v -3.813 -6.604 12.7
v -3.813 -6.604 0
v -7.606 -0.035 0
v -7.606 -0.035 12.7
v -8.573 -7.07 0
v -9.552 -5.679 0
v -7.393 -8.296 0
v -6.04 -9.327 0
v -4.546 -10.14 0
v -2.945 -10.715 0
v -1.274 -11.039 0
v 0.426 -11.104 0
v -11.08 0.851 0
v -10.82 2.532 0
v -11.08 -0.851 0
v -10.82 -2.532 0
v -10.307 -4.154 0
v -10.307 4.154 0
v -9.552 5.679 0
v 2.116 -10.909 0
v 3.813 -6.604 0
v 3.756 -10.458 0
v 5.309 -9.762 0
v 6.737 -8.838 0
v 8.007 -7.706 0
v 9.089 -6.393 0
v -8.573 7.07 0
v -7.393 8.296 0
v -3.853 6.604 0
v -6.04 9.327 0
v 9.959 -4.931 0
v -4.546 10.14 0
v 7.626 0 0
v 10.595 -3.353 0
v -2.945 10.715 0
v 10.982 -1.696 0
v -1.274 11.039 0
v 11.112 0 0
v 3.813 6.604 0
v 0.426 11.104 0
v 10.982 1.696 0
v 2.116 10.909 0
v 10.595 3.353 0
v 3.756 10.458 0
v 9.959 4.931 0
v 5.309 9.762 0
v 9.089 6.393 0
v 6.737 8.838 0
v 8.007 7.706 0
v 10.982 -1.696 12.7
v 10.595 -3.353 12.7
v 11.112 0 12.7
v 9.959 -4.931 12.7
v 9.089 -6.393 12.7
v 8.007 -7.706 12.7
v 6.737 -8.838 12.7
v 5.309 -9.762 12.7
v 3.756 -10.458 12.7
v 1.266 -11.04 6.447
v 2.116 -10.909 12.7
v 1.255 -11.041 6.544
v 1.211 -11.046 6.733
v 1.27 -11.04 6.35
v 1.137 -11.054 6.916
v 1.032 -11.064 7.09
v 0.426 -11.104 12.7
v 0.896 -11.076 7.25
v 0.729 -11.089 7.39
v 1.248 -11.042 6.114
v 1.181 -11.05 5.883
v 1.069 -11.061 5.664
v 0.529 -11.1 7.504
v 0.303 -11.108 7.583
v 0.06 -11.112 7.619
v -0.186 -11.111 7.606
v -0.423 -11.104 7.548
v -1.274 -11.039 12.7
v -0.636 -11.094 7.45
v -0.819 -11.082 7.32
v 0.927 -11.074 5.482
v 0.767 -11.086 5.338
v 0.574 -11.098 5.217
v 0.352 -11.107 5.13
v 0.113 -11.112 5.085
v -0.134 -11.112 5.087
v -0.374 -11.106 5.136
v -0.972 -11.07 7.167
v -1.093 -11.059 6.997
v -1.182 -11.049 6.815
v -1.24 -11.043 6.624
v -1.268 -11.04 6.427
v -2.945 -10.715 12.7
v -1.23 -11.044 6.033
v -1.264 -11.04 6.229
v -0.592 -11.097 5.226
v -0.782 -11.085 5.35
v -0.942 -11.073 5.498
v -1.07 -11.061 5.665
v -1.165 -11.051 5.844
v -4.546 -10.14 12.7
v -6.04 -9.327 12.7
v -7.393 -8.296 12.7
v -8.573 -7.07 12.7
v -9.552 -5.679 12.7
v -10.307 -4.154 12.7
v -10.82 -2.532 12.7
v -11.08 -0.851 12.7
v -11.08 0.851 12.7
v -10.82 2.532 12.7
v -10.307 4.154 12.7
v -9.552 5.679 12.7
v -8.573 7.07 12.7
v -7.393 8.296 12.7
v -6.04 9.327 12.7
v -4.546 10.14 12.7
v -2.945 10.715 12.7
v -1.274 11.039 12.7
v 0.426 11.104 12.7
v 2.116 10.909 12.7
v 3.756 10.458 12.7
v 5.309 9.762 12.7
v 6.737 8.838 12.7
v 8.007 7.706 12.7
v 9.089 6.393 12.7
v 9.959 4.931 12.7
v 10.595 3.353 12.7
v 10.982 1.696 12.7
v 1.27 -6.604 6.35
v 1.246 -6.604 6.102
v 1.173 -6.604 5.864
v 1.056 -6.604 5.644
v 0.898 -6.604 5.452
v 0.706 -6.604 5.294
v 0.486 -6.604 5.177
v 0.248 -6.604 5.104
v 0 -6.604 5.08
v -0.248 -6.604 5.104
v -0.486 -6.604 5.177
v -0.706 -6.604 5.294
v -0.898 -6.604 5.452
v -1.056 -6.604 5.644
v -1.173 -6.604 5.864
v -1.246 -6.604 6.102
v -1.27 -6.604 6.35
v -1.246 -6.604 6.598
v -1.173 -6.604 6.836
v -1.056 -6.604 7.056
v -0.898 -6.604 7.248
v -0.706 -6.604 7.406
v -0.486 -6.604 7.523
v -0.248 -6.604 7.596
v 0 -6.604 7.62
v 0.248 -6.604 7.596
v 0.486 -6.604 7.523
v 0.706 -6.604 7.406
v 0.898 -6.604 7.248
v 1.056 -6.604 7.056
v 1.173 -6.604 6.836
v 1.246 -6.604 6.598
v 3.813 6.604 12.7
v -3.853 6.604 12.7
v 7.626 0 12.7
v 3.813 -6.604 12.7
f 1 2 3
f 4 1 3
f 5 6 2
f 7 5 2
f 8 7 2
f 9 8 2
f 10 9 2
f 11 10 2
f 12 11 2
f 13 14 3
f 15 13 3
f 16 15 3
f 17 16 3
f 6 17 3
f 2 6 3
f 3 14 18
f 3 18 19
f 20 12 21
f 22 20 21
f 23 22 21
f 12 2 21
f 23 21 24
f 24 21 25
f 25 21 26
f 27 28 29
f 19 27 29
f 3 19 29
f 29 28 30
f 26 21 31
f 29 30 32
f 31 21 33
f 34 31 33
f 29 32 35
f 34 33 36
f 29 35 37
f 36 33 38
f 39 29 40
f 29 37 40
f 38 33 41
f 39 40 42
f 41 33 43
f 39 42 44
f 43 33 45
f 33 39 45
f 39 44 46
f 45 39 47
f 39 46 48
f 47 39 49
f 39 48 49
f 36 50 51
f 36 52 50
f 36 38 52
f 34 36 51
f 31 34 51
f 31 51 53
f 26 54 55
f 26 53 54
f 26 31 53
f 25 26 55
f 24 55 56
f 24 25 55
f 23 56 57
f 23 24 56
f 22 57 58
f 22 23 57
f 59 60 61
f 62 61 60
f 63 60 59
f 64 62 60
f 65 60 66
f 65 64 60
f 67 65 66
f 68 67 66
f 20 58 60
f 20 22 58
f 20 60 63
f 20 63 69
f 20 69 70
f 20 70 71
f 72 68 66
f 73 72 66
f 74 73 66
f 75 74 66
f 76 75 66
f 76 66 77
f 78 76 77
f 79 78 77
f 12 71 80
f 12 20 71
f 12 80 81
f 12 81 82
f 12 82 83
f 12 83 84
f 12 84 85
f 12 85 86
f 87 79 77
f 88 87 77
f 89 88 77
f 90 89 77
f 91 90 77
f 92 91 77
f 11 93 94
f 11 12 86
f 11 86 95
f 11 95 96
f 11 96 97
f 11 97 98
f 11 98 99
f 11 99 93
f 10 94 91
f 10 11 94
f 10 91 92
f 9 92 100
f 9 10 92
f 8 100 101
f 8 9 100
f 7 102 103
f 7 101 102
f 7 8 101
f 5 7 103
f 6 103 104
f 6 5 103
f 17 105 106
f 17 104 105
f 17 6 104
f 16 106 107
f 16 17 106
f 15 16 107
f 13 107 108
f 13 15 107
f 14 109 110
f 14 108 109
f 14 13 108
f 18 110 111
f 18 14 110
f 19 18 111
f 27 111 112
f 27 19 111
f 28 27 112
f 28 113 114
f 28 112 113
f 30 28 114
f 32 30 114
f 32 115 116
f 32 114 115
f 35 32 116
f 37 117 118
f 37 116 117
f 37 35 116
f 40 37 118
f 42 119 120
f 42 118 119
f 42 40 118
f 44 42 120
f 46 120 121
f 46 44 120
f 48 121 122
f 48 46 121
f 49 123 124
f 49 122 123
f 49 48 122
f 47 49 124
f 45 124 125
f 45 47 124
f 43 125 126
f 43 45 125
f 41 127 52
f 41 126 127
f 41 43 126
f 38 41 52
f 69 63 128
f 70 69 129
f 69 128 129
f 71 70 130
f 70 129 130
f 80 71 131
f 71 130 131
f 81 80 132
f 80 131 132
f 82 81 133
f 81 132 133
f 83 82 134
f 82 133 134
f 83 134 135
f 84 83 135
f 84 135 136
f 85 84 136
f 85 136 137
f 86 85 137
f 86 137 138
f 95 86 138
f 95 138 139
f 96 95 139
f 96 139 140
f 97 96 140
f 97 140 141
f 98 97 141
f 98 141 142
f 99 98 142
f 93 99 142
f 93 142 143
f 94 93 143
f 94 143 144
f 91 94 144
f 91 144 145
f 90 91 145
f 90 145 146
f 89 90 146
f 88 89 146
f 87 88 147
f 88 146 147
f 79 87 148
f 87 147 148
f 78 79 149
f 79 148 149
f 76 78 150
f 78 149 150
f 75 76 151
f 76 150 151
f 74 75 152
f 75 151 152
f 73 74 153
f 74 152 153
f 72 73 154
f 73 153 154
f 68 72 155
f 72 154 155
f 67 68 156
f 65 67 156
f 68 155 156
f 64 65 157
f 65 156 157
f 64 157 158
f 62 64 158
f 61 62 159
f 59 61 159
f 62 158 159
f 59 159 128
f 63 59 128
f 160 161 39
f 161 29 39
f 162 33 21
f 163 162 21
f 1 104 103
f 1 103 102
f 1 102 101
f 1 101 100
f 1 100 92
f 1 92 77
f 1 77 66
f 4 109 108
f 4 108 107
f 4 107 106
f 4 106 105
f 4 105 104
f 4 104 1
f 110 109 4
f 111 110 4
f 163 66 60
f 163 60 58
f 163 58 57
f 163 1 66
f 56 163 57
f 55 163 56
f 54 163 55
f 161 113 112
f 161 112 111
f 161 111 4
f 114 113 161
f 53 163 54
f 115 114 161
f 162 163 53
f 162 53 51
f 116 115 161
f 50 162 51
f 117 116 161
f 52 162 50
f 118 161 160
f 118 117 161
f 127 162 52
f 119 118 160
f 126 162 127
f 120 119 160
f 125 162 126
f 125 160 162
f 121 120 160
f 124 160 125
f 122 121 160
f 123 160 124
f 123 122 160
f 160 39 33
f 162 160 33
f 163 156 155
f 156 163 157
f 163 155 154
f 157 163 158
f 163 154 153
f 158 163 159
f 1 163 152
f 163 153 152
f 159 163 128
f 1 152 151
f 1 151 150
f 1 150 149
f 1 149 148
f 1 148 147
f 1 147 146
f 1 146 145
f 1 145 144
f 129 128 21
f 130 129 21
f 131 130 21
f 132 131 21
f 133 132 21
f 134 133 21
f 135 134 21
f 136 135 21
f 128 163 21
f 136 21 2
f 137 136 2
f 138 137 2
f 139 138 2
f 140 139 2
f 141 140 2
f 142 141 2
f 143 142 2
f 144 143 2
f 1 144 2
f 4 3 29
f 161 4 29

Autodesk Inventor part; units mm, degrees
ref_plane "YZ Plane" through (0, 0, 0) normal (1, 0, 0) x (0, 1, 0)
ref_plane "XZ Plane" through (0, 0, 0) normal (0, 1, 0) x (-1, 0, 0)
ref_plane "XY Plane" through (0, 0, 0) normal (0, 0, 1) x (1, 0, 0)
sketch "Sketch1" plane through (0, 0, 0) normal (0, 0, 1) x (1, 0, 0)
  circle A0 centre (0, 0) radius 11.1125
  line L0 (0, 0) -> (7.6256, 0)
  line L1 (-3.8526, 6.604) -> (3.8128, 6.604)
  line L2 (3.8128, 6.604) -> (7.6256, 0)
  line L3 (7.6256, 0) -> (3.8128, -6.604)
  line L4 (3.8128, -6.604) -> (-3.8128, -6.604)
  line L5 (-3.8128, -6.604) -> (-7.6056, -0.0348)
  line L6 (-7.6056, -0.0348) -> (-3.8526, 6.604)
  line L7 (0, 0) -> (0, 6.604)
  line L8 (0, 0) -> (0, -6.604)
  line L9 (0, 0) -> (-5.7192, 3.302)
  line L10 (0, 0) -> (5.7192, -3.302)
  line L11 (0, 0) -> (5.7192, 3.302)
  line L12 (0, 0) -> (-5.7192, -3.302)
  line L13 (-7.2737, 0.1016) -> (-3.7248, 6.2484)
  line L14 (-3.5489, 6.35) -> (3.5489, 6.35)
  arc A1 (3.7248, 6.2484) -> (3.5489, 6.35) centre (3.5489, 6.1468) ccw
  line L15 (3.7248, 6.2484) -> (7.2737, 0.1016)
  arc A2 (-3.5489, 6.35) -> (-3.7248, 6.2484) centre (-3.5489, 6.1468) ccw
  arc A3 (-7.2737, 0.1016) -> (-7.2737, -0.1016) centre (-7.0977, 0) ccw
  line L16 (-3.7248, -6.2484) -> (-7.2737, -0.1016)
  line L17 (3.5489, -6.35) -> (-3.5489, -6.35)
  arc A4 (-3.7248, -6.2484) -> (-3.5489, -6.35) centre (-3.5489, -6.1468) ccw
  arc A5 (3.5489, -6.35) -> (3.7248, -6.2484) centre (3.5489, -6.1468) ccw
  line L18 (7.2737, -0.1016) -> (3.7248, -6.2484)
  arc A6 (7.2737, -0.1016) -> (7.2737, 0.1016) centre (7.0977, 0) ccw
  point P0 (0, 0)
  dimension "d0" = 22.225
  dimension "d19" = 6.604
  dimension "d20" = 6.604
  dimension "d21" = 6.604
  dimension "d22" = 6.604
  dimension "d23" = 60
  dimension "d24" = 60
  dimension "d25" = 6.604
  dimension "d26" = 6.604
  dimension "d27" = 60
  dimension "d28" = 60
  dimension "d30" = 13.208
extrude "Extrusion1" add sketch "Sketch1" along normal blind 12.7
sketch "Sketch3" plane through (-3.8128, -6.604, 0) normal (0, 1, 0) x (1, 0, 0)
  line L0 (11.4385, -12.7) -> (7.6256, -12.7) projected
  line L1 (7.6256, 0) -> (0, 0) projected
  line L2 (7.6256, -12.7) -> (0, 0)
  line L3 (7.6256, 0) -> (7.6256, -12.7) projected
  line L4 (0, 0) -> (7.6256, 0)
  line L5 (7.6256, 0) -> (7.6256, -12.7)
  line L6 (7.6256, -12.7) -> (0, -12.7) projected
  line L7 (7.6256, -12.7) -> (0, -12.7)
  line L8 (0, -12.7) -> (7.6256, 0)
  line L9 (0, 0) -> (0, -12.7)
  circle A0 centre (3.8128, -6.35) radius 1.27
  point P0 (3.8128, 0)
  dimension "d31" = 2.54
extrude "Extrusion2" cut sketch "Sketch3" against normal through all contours A0 L2 L8 | L8 L2 A0 | L2 L8 A0 | A0 L8 L2
properties part number "Churro Spacer"
